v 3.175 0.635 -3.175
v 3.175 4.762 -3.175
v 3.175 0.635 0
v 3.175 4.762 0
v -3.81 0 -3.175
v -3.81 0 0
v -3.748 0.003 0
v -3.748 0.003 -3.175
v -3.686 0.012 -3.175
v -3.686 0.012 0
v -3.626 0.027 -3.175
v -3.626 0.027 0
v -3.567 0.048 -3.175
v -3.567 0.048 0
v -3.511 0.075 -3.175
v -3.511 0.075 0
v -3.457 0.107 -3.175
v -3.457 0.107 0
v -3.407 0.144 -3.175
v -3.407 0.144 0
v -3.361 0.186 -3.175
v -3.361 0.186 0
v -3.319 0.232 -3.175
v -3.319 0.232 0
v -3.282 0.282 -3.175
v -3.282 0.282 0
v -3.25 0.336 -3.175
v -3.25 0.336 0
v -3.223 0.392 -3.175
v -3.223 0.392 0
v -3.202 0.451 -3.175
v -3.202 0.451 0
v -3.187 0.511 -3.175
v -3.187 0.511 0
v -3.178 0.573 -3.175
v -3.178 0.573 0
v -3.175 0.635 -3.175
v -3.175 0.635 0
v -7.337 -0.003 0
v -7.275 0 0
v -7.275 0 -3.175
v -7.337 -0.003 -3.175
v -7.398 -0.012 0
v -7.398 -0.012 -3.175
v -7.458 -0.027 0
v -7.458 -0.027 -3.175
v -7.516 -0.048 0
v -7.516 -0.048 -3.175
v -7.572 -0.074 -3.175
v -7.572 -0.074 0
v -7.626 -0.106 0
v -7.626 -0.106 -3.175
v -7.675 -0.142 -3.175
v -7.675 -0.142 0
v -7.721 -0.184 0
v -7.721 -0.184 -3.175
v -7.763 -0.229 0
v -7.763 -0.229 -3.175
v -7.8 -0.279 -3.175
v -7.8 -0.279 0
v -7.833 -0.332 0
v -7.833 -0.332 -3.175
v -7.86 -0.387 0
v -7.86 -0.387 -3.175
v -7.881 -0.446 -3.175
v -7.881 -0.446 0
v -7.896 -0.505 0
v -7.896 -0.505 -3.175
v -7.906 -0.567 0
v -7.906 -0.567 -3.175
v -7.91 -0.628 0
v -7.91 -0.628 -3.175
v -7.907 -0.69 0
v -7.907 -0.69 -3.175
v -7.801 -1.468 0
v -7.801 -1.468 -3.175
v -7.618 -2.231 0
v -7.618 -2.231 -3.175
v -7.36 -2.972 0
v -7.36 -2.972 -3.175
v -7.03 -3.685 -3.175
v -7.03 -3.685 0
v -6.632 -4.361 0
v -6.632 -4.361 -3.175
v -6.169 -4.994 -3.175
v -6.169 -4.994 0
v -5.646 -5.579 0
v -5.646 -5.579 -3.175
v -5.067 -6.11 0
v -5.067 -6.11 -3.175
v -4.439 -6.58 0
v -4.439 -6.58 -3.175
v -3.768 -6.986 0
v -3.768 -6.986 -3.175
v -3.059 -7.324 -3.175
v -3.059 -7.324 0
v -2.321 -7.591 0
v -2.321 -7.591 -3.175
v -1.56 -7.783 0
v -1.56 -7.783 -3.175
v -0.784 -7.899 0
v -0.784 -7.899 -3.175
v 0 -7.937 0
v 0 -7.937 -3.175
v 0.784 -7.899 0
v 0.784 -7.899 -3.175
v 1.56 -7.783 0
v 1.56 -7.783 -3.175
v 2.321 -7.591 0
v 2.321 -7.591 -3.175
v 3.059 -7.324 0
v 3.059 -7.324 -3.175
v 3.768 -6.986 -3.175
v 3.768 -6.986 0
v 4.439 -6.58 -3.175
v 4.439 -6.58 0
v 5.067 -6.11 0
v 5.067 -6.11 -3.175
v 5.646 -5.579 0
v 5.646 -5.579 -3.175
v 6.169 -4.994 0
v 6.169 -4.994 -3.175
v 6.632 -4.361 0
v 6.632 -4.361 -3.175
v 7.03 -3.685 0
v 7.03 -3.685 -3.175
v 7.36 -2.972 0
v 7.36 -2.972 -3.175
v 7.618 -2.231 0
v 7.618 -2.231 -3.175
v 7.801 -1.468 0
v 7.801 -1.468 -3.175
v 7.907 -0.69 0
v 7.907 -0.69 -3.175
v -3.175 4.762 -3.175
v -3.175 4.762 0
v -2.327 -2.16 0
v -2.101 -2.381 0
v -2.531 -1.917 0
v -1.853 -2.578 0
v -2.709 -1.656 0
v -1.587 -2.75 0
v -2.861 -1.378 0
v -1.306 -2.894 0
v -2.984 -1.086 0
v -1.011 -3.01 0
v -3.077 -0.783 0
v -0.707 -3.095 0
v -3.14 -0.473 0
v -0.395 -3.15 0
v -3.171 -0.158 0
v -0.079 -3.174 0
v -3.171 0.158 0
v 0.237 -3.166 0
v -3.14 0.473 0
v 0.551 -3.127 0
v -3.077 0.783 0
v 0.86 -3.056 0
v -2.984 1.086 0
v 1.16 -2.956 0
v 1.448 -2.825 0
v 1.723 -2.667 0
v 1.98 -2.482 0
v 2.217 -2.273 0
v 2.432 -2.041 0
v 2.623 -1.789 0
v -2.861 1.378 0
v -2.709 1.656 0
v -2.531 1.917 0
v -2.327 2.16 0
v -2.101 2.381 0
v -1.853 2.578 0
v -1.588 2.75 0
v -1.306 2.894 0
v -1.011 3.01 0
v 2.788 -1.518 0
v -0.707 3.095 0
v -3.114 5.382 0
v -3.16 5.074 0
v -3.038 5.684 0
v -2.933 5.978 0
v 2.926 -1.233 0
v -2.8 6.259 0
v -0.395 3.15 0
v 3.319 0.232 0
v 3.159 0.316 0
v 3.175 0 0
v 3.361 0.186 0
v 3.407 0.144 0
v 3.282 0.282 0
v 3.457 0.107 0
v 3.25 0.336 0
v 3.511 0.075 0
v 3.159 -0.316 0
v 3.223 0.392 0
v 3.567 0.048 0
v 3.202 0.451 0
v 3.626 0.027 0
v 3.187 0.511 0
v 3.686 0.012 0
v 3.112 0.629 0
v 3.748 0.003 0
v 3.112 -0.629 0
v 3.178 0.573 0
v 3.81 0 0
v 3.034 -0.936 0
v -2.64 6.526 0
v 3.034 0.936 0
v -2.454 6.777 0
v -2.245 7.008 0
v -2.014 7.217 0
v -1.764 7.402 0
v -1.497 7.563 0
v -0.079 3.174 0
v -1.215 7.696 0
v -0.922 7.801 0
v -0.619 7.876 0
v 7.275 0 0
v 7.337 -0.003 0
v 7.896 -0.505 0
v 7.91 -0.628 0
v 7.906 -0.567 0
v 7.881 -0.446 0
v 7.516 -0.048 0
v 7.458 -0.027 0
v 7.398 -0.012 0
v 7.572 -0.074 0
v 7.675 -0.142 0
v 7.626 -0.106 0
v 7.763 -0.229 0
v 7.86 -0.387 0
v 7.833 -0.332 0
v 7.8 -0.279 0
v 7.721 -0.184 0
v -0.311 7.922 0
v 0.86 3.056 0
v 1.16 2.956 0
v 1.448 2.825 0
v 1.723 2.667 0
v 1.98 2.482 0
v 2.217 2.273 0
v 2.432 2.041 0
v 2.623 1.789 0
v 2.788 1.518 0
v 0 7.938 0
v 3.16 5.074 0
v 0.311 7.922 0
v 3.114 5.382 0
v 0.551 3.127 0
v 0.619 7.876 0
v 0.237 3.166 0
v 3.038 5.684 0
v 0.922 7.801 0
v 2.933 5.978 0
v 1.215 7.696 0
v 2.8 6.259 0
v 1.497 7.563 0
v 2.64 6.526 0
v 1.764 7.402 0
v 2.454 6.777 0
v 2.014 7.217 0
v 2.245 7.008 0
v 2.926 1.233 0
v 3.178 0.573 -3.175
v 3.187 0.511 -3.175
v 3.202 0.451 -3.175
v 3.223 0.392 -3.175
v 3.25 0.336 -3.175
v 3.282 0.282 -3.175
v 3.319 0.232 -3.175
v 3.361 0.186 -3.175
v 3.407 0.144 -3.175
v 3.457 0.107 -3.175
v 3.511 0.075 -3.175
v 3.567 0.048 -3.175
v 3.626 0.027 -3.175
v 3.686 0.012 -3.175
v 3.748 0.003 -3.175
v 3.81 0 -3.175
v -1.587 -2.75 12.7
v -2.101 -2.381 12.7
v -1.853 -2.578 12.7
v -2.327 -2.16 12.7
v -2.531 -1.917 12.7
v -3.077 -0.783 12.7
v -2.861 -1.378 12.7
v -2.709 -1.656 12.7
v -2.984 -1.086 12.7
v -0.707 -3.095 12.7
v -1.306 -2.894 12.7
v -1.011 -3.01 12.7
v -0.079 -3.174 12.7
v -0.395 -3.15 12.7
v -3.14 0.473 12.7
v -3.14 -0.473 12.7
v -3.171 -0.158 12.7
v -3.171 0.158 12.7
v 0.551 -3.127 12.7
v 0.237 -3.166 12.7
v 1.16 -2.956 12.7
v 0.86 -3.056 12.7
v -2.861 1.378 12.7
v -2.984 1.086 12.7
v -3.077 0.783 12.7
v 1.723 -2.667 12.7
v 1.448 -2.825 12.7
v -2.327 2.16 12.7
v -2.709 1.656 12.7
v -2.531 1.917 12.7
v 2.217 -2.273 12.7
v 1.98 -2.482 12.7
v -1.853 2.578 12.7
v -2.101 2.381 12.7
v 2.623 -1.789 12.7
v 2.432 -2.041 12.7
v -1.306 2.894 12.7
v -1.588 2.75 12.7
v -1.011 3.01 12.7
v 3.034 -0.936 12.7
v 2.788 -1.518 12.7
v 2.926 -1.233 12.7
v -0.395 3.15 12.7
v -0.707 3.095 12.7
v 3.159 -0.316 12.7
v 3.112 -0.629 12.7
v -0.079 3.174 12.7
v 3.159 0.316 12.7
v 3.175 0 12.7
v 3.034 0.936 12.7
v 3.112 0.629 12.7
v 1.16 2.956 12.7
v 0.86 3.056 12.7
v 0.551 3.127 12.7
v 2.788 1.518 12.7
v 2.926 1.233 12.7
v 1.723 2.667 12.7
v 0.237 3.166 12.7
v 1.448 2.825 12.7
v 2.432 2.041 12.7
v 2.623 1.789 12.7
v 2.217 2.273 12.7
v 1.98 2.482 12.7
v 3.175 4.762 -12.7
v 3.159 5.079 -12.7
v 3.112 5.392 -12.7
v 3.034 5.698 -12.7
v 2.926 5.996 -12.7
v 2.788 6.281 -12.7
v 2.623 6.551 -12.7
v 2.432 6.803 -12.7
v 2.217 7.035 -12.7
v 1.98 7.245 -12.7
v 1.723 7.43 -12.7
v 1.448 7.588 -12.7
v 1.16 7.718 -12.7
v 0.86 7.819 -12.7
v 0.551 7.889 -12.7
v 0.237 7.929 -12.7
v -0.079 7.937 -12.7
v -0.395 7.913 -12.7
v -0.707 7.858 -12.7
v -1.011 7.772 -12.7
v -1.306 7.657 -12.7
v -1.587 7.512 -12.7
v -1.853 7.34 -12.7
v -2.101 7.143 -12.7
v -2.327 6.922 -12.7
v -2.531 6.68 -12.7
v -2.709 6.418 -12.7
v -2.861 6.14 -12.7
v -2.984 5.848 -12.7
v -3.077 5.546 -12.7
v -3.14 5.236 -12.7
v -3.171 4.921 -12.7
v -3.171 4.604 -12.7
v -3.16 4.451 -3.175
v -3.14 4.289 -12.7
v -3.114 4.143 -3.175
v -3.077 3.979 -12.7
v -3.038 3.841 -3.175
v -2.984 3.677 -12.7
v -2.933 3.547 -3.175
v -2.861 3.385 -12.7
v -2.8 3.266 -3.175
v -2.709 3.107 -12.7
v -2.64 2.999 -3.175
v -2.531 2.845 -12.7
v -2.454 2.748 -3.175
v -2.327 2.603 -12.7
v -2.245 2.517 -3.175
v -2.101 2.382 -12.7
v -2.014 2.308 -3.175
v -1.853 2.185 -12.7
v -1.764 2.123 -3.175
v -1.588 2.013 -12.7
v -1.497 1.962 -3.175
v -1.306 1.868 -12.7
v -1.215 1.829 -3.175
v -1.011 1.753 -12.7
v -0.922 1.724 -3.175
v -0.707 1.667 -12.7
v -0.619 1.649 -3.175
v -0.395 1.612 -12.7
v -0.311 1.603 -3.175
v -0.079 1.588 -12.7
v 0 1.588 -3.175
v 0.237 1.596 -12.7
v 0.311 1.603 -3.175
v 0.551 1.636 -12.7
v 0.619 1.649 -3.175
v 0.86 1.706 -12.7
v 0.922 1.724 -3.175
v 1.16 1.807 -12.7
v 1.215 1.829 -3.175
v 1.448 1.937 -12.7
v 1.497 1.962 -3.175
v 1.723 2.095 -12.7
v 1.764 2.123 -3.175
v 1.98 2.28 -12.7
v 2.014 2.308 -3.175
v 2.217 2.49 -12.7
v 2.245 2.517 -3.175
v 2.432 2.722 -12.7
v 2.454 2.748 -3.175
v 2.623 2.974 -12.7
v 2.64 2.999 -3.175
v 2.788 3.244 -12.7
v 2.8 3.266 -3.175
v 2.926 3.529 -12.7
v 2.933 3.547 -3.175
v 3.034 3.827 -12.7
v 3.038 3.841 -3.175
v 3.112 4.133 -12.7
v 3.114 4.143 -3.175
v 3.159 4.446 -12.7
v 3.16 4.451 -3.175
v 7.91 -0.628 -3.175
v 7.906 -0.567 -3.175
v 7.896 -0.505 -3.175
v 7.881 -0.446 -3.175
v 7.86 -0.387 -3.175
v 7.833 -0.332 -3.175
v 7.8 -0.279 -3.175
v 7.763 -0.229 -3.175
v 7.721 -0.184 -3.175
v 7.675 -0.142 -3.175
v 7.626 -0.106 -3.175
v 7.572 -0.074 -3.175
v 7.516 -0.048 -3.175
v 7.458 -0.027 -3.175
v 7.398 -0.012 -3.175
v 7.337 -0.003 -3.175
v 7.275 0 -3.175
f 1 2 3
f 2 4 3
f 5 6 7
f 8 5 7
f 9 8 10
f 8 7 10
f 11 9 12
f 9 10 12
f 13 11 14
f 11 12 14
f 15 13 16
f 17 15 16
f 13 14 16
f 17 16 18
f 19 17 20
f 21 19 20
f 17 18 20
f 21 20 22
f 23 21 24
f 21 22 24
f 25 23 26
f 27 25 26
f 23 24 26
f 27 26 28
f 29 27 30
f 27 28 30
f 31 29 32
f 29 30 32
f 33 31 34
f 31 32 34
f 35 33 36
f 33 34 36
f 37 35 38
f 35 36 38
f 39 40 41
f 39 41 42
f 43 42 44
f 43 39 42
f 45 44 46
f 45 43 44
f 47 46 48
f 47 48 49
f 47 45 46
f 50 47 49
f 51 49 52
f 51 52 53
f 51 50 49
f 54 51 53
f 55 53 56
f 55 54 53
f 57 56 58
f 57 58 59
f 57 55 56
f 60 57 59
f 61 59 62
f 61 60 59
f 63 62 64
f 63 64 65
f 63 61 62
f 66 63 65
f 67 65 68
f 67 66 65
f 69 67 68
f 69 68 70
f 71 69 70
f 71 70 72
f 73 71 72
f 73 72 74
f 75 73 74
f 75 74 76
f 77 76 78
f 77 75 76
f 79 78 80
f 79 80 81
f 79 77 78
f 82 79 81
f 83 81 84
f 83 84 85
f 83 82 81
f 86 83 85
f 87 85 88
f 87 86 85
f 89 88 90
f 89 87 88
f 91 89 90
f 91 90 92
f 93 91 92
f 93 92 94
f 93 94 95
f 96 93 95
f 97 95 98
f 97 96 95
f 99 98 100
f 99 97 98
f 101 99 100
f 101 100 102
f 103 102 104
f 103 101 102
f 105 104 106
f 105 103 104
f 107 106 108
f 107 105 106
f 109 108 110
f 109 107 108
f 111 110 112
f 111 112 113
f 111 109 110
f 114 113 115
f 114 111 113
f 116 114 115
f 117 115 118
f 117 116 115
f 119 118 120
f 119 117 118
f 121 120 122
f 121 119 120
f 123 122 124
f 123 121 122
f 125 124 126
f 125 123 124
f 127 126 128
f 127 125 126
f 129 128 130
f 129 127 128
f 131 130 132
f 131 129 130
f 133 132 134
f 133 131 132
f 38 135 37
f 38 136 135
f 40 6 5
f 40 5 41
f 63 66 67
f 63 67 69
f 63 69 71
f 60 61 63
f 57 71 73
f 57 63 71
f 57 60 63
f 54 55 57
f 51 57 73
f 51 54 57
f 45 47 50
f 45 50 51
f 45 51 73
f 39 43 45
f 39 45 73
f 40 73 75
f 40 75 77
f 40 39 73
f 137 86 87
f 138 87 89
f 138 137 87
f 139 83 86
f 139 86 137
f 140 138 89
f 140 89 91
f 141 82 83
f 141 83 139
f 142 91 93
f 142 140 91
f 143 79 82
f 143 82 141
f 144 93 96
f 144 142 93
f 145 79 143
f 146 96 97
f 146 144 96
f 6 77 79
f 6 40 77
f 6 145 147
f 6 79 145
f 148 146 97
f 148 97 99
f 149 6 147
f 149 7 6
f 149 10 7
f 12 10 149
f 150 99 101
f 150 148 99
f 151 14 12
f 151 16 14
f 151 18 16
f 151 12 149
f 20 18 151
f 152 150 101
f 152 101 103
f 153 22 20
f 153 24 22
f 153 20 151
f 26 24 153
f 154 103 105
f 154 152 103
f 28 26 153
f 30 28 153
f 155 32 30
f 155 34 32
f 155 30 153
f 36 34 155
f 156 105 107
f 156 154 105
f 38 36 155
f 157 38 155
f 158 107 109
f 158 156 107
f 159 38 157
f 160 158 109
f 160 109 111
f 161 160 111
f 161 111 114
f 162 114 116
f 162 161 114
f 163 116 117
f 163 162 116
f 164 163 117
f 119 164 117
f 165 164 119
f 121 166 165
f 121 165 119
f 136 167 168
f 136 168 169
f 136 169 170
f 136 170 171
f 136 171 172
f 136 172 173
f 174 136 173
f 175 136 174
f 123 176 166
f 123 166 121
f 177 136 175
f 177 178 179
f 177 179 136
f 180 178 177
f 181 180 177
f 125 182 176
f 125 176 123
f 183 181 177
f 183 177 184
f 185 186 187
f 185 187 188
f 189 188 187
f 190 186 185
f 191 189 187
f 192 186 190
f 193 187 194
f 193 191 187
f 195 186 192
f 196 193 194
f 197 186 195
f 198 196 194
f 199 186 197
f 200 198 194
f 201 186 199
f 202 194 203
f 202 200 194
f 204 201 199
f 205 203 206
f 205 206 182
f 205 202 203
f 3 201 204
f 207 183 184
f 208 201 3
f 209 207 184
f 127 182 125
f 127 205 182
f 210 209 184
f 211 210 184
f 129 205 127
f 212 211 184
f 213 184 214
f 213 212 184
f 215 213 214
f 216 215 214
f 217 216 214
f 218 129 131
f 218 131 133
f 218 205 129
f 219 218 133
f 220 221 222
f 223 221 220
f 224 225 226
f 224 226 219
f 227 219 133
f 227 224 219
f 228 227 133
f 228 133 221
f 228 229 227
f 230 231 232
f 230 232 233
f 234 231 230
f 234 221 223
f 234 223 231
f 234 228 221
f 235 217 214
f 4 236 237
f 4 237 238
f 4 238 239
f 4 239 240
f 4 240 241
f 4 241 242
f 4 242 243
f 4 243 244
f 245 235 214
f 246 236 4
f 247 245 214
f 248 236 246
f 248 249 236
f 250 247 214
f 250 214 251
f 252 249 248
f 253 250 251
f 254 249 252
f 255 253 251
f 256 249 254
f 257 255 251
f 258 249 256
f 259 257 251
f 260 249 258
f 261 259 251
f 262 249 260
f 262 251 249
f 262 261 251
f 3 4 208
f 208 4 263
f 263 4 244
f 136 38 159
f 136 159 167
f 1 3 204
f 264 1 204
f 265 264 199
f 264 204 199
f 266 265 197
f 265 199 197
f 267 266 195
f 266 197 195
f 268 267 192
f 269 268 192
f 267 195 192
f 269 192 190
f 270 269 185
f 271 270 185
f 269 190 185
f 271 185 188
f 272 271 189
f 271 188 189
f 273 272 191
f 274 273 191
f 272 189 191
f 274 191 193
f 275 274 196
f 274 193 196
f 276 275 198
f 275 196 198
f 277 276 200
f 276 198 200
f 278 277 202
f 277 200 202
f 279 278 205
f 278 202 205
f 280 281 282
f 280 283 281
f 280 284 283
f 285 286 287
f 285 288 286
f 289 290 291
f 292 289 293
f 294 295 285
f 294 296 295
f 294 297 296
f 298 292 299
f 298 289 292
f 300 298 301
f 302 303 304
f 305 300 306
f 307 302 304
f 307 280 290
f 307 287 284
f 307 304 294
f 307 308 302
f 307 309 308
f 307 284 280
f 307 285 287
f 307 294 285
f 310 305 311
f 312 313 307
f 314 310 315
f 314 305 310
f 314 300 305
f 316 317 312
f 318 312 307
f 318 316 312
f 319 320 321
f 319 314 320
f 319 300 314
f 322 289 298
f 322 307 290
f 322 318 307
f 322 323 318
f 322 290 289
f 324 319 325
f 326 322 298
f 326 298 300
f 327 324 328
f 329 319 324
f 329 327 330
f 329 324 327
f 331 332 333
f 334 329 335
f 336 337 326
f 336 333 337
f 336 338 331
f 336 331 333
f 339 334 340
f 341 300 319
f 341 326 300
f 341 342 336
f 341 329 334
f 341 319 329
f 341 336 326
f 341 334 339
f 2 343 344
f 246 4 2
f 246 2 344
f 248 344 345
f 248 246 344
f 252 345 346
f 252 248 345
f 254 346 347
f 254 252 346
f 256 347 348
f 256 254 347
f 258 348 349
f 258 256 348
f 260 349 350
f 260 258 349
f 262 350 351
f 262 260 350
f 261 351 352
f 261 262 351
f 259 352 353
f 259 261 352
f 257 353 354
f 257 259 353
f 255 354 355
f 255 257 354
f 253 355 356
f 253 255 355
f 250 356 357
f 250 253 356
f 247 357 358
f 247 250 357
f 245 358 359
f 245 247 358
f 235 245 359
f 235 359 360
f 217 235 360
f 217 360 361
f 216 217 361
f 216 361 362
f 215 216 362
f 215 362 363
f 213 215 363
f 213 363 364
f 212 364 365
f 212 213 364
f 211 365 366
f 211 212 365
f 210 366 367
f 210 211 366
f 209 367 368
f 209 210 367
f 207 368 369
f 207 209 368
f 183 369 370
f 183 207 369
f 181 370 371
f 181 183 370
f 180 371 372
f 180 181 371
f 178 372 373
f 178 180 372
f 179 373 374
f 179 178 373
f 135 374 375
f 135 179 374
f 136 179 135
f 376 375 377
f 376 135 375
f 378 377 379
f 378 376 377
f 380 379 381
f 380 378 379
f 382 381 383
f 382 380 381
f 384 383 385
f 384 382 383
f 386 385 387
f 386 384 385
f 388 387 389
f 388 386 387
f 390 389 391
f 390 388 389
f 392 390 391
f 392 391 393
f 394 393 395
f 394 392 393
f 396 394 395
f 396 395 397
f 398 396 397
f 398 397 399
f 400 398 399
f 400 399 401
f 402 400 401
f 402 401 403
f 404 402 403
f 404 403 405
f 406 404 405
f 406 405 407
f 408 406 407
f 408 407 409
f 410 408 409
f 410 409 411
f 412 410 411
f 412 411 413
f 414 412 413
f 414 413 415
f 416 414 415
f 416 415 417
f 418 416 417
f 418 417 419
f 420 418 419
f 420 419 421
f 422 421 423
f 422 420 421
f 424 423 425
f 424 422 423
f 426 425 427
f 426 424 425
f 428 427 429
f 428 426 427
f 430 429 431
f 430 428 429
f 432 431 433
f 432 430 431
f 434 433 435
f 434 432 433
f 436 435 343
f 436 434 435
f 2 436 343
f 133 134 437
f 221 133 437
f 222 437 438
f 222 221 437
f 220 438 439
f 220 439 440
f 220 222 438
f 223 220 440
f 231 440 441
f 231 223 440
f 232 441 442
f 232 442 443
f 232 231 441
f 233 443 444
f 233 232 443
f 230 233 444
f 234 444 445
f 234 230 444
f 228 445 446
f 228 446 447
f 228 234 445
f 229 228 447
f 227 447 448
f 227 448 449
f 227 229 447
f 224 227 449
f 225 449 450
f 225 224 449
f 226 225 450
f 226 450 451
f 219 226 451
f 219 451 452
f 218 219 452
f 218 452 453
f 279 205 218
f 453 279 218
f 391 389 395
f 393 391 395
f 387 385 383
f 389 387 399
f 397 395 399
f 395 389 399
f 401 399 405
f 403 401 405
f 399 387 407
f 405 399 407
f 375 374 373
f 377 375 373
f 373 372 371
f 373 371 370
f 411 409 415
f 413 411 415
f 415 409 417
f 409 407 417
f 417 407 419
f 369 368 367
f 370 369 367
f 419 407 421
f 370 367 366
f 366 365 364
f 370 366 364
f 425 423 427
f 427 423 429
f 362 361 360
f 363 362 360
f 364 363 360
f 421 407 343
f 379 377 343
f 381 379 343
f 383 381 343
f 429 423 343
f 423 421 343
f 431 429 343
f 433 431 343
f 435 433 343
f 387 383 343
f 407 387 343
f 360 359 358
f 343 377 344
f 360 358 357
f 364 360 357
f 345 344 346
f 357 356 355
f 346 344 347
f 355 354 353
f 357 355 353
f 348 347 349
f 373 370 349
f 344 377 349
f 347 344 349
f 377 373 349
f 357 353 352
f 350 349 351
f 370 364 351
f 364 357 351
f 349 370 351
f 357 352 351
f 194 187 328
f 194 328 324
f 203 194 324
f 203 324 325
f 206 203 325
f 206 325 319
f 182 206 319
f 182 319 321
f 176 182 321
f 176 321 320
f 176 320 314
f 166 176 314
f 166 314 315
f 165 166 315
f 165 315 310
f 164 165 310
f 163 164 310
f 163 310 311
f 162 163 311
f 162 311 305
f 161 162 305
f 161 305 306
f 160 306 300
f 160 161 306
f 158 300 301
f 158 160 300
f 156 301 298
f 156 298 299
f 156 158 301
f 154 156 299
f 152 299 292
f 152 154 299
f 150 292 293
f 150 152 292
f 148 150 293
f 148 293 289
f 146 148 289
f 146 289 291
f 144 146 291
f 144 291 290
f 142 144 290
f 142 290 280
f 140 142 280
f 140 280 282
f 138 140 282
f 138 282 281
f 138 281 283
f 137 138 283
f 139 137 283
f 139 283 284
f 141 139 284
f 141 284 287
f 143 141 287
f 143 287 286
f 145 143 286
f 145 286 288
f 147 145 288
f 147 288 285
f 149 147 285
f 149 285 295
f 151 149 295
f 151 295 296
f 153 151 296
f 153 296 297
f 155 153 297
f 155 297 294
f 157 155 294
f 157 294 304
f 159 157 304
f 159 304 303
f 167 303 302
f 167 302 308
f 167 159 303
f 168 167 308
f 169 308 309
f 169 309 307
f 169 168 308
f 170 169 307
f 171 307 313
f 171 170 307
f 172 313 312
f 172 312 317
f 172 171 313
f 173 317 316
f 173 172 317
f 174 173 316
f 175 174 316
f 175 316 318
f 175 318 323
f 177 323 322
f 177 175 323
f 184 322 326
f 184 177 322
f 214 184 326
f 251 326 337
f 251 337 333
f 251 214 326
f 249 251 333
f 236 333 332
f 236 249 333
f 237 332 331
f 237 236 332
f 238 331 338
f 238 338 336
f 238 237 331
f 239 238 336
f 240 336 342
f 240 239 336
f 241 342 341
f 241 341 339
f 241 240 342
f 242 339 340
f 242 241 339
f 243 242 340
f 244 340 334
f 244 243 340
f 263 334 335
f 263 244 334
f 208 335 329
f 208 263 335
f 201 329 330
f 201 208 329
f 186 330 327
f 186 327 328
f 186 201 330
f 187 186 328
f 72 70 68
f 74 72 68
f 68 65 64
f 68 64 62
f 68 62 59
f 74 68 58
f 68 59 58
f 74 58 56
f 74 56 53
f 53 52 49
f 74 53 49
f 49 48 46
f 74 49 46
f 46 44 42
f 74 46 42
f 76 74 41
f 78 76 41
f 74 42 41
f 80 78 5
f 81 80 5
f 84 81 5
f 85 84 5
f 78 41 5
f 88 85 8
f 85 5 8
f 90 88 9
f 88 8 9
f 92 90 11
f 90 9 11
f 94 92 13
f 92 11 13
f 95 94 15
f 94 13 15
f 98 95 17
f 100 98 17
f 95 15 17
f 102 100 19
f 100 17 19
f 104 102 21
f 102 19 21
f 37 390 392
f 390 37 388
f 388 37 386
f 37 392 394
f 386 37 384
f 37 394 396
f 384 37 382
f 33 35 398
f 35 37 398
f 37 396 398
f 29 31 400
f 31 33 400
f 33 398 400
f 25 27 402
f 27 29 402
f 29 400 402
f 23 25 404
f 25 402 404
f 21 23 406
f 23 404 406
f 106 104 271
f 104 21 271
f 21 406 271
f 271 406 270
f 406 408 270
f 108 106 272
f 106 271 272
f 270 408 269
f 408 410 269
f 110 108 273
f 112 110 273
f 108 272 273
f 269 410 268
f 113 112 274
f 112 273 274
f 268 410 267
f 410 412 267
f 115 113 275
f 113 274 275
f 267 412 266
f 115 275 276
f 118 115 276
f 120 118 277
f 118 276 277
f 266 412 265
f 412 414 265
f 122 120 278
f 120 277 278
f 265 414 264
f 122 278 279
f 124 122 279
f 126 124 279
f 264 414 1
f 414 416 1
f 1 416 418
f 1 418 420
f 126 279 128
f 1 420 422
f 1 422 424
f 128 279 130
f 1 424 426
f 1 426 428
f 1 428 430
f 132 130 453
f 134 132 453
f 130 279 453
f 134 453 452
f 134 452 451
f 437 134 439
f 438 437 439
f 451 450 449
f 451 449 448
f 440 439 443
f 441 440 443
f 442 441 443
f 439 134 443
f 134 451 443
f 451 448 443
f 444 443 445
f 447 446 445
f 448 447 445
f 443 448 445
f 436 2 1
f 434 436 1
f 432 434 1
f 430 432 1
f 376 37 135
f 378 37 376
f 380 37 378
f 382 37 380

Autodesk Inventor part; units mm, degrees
ref_plane "YZ Plane" through (0, 0, 0) normal (1, 0, 0) x (0, 1, 0)
ref_plane "XZ Plane" through (0, 0, 0) normal (0, 1, 0) x (-1, 0, 0)
ref_plane "XY Plane" through (0, 0, 0) normal (0, 0, 1) x (1, 0, 0)
sketch "Sketch1" plane through (0, 0, 0) normal (0, 0, 1) x (1, 0, 0)
  circle A0 centre (0, 4.7625) radius 3.175
  arc A1 (-7.9074, -0.6902) -> (7.9074, -0.6902) centre (0, 0) ccw
  line L0 (3.175, 4.7625) -> (3.175, 0.635)
  line L1 (3.81, 0) -> (7.2748, 0)
  line L2 (-3.175, 4.7625) -> (-3.175, 0.635)
  line L3 (-3.81, 0) -> (-7.2748, 0)
  arc A2 (-7.2748, 0) -> (-7.9074, -0.6902) centre (-7.2748, -0.635) ccw
  arc A3 (-3.81, 0) -> (-3.175, 0.635) centre (-3.81, 0.635) ccw
  arc A4 (3.175, 0.635) -> (3.81, 0) centre (3.81, 0.635) ccw
  arc A5 (7.9074, -0.6902) -> (7.2748, 0) centre (7.2748, -0.635) ccw
  circle A6 centre (0, 0) radius 3.175
  circle A7 centre (0, 4.7625) radius 3.175
  point P0 (-3.175, 0)
  point P1 (-7.9375, 0)
  point P2 (7.9375, 0)
  dimension "d2" = 0.635
  dimension "d3" = 0.635
  dimension "d4" = 6.35
extrude "Extrusion1" add sketch "Sketch1" along normal blind 12.7 contours A6 A0 | A0 A6 picked at (-0.105, -1.5684) picked at (-0.2525, 2.1472)
extrude "Extrusion2" add sketch "Sketch1" against normal blind 3.175
extrude "Extrusion3" add sketch "Sketch1" against normal blind 12.7 contours A0 A6 | A0 A6 picked at (0, 6.3346) picked at (-0.2525, 2.1472)
properties part number "Crankshaft"
